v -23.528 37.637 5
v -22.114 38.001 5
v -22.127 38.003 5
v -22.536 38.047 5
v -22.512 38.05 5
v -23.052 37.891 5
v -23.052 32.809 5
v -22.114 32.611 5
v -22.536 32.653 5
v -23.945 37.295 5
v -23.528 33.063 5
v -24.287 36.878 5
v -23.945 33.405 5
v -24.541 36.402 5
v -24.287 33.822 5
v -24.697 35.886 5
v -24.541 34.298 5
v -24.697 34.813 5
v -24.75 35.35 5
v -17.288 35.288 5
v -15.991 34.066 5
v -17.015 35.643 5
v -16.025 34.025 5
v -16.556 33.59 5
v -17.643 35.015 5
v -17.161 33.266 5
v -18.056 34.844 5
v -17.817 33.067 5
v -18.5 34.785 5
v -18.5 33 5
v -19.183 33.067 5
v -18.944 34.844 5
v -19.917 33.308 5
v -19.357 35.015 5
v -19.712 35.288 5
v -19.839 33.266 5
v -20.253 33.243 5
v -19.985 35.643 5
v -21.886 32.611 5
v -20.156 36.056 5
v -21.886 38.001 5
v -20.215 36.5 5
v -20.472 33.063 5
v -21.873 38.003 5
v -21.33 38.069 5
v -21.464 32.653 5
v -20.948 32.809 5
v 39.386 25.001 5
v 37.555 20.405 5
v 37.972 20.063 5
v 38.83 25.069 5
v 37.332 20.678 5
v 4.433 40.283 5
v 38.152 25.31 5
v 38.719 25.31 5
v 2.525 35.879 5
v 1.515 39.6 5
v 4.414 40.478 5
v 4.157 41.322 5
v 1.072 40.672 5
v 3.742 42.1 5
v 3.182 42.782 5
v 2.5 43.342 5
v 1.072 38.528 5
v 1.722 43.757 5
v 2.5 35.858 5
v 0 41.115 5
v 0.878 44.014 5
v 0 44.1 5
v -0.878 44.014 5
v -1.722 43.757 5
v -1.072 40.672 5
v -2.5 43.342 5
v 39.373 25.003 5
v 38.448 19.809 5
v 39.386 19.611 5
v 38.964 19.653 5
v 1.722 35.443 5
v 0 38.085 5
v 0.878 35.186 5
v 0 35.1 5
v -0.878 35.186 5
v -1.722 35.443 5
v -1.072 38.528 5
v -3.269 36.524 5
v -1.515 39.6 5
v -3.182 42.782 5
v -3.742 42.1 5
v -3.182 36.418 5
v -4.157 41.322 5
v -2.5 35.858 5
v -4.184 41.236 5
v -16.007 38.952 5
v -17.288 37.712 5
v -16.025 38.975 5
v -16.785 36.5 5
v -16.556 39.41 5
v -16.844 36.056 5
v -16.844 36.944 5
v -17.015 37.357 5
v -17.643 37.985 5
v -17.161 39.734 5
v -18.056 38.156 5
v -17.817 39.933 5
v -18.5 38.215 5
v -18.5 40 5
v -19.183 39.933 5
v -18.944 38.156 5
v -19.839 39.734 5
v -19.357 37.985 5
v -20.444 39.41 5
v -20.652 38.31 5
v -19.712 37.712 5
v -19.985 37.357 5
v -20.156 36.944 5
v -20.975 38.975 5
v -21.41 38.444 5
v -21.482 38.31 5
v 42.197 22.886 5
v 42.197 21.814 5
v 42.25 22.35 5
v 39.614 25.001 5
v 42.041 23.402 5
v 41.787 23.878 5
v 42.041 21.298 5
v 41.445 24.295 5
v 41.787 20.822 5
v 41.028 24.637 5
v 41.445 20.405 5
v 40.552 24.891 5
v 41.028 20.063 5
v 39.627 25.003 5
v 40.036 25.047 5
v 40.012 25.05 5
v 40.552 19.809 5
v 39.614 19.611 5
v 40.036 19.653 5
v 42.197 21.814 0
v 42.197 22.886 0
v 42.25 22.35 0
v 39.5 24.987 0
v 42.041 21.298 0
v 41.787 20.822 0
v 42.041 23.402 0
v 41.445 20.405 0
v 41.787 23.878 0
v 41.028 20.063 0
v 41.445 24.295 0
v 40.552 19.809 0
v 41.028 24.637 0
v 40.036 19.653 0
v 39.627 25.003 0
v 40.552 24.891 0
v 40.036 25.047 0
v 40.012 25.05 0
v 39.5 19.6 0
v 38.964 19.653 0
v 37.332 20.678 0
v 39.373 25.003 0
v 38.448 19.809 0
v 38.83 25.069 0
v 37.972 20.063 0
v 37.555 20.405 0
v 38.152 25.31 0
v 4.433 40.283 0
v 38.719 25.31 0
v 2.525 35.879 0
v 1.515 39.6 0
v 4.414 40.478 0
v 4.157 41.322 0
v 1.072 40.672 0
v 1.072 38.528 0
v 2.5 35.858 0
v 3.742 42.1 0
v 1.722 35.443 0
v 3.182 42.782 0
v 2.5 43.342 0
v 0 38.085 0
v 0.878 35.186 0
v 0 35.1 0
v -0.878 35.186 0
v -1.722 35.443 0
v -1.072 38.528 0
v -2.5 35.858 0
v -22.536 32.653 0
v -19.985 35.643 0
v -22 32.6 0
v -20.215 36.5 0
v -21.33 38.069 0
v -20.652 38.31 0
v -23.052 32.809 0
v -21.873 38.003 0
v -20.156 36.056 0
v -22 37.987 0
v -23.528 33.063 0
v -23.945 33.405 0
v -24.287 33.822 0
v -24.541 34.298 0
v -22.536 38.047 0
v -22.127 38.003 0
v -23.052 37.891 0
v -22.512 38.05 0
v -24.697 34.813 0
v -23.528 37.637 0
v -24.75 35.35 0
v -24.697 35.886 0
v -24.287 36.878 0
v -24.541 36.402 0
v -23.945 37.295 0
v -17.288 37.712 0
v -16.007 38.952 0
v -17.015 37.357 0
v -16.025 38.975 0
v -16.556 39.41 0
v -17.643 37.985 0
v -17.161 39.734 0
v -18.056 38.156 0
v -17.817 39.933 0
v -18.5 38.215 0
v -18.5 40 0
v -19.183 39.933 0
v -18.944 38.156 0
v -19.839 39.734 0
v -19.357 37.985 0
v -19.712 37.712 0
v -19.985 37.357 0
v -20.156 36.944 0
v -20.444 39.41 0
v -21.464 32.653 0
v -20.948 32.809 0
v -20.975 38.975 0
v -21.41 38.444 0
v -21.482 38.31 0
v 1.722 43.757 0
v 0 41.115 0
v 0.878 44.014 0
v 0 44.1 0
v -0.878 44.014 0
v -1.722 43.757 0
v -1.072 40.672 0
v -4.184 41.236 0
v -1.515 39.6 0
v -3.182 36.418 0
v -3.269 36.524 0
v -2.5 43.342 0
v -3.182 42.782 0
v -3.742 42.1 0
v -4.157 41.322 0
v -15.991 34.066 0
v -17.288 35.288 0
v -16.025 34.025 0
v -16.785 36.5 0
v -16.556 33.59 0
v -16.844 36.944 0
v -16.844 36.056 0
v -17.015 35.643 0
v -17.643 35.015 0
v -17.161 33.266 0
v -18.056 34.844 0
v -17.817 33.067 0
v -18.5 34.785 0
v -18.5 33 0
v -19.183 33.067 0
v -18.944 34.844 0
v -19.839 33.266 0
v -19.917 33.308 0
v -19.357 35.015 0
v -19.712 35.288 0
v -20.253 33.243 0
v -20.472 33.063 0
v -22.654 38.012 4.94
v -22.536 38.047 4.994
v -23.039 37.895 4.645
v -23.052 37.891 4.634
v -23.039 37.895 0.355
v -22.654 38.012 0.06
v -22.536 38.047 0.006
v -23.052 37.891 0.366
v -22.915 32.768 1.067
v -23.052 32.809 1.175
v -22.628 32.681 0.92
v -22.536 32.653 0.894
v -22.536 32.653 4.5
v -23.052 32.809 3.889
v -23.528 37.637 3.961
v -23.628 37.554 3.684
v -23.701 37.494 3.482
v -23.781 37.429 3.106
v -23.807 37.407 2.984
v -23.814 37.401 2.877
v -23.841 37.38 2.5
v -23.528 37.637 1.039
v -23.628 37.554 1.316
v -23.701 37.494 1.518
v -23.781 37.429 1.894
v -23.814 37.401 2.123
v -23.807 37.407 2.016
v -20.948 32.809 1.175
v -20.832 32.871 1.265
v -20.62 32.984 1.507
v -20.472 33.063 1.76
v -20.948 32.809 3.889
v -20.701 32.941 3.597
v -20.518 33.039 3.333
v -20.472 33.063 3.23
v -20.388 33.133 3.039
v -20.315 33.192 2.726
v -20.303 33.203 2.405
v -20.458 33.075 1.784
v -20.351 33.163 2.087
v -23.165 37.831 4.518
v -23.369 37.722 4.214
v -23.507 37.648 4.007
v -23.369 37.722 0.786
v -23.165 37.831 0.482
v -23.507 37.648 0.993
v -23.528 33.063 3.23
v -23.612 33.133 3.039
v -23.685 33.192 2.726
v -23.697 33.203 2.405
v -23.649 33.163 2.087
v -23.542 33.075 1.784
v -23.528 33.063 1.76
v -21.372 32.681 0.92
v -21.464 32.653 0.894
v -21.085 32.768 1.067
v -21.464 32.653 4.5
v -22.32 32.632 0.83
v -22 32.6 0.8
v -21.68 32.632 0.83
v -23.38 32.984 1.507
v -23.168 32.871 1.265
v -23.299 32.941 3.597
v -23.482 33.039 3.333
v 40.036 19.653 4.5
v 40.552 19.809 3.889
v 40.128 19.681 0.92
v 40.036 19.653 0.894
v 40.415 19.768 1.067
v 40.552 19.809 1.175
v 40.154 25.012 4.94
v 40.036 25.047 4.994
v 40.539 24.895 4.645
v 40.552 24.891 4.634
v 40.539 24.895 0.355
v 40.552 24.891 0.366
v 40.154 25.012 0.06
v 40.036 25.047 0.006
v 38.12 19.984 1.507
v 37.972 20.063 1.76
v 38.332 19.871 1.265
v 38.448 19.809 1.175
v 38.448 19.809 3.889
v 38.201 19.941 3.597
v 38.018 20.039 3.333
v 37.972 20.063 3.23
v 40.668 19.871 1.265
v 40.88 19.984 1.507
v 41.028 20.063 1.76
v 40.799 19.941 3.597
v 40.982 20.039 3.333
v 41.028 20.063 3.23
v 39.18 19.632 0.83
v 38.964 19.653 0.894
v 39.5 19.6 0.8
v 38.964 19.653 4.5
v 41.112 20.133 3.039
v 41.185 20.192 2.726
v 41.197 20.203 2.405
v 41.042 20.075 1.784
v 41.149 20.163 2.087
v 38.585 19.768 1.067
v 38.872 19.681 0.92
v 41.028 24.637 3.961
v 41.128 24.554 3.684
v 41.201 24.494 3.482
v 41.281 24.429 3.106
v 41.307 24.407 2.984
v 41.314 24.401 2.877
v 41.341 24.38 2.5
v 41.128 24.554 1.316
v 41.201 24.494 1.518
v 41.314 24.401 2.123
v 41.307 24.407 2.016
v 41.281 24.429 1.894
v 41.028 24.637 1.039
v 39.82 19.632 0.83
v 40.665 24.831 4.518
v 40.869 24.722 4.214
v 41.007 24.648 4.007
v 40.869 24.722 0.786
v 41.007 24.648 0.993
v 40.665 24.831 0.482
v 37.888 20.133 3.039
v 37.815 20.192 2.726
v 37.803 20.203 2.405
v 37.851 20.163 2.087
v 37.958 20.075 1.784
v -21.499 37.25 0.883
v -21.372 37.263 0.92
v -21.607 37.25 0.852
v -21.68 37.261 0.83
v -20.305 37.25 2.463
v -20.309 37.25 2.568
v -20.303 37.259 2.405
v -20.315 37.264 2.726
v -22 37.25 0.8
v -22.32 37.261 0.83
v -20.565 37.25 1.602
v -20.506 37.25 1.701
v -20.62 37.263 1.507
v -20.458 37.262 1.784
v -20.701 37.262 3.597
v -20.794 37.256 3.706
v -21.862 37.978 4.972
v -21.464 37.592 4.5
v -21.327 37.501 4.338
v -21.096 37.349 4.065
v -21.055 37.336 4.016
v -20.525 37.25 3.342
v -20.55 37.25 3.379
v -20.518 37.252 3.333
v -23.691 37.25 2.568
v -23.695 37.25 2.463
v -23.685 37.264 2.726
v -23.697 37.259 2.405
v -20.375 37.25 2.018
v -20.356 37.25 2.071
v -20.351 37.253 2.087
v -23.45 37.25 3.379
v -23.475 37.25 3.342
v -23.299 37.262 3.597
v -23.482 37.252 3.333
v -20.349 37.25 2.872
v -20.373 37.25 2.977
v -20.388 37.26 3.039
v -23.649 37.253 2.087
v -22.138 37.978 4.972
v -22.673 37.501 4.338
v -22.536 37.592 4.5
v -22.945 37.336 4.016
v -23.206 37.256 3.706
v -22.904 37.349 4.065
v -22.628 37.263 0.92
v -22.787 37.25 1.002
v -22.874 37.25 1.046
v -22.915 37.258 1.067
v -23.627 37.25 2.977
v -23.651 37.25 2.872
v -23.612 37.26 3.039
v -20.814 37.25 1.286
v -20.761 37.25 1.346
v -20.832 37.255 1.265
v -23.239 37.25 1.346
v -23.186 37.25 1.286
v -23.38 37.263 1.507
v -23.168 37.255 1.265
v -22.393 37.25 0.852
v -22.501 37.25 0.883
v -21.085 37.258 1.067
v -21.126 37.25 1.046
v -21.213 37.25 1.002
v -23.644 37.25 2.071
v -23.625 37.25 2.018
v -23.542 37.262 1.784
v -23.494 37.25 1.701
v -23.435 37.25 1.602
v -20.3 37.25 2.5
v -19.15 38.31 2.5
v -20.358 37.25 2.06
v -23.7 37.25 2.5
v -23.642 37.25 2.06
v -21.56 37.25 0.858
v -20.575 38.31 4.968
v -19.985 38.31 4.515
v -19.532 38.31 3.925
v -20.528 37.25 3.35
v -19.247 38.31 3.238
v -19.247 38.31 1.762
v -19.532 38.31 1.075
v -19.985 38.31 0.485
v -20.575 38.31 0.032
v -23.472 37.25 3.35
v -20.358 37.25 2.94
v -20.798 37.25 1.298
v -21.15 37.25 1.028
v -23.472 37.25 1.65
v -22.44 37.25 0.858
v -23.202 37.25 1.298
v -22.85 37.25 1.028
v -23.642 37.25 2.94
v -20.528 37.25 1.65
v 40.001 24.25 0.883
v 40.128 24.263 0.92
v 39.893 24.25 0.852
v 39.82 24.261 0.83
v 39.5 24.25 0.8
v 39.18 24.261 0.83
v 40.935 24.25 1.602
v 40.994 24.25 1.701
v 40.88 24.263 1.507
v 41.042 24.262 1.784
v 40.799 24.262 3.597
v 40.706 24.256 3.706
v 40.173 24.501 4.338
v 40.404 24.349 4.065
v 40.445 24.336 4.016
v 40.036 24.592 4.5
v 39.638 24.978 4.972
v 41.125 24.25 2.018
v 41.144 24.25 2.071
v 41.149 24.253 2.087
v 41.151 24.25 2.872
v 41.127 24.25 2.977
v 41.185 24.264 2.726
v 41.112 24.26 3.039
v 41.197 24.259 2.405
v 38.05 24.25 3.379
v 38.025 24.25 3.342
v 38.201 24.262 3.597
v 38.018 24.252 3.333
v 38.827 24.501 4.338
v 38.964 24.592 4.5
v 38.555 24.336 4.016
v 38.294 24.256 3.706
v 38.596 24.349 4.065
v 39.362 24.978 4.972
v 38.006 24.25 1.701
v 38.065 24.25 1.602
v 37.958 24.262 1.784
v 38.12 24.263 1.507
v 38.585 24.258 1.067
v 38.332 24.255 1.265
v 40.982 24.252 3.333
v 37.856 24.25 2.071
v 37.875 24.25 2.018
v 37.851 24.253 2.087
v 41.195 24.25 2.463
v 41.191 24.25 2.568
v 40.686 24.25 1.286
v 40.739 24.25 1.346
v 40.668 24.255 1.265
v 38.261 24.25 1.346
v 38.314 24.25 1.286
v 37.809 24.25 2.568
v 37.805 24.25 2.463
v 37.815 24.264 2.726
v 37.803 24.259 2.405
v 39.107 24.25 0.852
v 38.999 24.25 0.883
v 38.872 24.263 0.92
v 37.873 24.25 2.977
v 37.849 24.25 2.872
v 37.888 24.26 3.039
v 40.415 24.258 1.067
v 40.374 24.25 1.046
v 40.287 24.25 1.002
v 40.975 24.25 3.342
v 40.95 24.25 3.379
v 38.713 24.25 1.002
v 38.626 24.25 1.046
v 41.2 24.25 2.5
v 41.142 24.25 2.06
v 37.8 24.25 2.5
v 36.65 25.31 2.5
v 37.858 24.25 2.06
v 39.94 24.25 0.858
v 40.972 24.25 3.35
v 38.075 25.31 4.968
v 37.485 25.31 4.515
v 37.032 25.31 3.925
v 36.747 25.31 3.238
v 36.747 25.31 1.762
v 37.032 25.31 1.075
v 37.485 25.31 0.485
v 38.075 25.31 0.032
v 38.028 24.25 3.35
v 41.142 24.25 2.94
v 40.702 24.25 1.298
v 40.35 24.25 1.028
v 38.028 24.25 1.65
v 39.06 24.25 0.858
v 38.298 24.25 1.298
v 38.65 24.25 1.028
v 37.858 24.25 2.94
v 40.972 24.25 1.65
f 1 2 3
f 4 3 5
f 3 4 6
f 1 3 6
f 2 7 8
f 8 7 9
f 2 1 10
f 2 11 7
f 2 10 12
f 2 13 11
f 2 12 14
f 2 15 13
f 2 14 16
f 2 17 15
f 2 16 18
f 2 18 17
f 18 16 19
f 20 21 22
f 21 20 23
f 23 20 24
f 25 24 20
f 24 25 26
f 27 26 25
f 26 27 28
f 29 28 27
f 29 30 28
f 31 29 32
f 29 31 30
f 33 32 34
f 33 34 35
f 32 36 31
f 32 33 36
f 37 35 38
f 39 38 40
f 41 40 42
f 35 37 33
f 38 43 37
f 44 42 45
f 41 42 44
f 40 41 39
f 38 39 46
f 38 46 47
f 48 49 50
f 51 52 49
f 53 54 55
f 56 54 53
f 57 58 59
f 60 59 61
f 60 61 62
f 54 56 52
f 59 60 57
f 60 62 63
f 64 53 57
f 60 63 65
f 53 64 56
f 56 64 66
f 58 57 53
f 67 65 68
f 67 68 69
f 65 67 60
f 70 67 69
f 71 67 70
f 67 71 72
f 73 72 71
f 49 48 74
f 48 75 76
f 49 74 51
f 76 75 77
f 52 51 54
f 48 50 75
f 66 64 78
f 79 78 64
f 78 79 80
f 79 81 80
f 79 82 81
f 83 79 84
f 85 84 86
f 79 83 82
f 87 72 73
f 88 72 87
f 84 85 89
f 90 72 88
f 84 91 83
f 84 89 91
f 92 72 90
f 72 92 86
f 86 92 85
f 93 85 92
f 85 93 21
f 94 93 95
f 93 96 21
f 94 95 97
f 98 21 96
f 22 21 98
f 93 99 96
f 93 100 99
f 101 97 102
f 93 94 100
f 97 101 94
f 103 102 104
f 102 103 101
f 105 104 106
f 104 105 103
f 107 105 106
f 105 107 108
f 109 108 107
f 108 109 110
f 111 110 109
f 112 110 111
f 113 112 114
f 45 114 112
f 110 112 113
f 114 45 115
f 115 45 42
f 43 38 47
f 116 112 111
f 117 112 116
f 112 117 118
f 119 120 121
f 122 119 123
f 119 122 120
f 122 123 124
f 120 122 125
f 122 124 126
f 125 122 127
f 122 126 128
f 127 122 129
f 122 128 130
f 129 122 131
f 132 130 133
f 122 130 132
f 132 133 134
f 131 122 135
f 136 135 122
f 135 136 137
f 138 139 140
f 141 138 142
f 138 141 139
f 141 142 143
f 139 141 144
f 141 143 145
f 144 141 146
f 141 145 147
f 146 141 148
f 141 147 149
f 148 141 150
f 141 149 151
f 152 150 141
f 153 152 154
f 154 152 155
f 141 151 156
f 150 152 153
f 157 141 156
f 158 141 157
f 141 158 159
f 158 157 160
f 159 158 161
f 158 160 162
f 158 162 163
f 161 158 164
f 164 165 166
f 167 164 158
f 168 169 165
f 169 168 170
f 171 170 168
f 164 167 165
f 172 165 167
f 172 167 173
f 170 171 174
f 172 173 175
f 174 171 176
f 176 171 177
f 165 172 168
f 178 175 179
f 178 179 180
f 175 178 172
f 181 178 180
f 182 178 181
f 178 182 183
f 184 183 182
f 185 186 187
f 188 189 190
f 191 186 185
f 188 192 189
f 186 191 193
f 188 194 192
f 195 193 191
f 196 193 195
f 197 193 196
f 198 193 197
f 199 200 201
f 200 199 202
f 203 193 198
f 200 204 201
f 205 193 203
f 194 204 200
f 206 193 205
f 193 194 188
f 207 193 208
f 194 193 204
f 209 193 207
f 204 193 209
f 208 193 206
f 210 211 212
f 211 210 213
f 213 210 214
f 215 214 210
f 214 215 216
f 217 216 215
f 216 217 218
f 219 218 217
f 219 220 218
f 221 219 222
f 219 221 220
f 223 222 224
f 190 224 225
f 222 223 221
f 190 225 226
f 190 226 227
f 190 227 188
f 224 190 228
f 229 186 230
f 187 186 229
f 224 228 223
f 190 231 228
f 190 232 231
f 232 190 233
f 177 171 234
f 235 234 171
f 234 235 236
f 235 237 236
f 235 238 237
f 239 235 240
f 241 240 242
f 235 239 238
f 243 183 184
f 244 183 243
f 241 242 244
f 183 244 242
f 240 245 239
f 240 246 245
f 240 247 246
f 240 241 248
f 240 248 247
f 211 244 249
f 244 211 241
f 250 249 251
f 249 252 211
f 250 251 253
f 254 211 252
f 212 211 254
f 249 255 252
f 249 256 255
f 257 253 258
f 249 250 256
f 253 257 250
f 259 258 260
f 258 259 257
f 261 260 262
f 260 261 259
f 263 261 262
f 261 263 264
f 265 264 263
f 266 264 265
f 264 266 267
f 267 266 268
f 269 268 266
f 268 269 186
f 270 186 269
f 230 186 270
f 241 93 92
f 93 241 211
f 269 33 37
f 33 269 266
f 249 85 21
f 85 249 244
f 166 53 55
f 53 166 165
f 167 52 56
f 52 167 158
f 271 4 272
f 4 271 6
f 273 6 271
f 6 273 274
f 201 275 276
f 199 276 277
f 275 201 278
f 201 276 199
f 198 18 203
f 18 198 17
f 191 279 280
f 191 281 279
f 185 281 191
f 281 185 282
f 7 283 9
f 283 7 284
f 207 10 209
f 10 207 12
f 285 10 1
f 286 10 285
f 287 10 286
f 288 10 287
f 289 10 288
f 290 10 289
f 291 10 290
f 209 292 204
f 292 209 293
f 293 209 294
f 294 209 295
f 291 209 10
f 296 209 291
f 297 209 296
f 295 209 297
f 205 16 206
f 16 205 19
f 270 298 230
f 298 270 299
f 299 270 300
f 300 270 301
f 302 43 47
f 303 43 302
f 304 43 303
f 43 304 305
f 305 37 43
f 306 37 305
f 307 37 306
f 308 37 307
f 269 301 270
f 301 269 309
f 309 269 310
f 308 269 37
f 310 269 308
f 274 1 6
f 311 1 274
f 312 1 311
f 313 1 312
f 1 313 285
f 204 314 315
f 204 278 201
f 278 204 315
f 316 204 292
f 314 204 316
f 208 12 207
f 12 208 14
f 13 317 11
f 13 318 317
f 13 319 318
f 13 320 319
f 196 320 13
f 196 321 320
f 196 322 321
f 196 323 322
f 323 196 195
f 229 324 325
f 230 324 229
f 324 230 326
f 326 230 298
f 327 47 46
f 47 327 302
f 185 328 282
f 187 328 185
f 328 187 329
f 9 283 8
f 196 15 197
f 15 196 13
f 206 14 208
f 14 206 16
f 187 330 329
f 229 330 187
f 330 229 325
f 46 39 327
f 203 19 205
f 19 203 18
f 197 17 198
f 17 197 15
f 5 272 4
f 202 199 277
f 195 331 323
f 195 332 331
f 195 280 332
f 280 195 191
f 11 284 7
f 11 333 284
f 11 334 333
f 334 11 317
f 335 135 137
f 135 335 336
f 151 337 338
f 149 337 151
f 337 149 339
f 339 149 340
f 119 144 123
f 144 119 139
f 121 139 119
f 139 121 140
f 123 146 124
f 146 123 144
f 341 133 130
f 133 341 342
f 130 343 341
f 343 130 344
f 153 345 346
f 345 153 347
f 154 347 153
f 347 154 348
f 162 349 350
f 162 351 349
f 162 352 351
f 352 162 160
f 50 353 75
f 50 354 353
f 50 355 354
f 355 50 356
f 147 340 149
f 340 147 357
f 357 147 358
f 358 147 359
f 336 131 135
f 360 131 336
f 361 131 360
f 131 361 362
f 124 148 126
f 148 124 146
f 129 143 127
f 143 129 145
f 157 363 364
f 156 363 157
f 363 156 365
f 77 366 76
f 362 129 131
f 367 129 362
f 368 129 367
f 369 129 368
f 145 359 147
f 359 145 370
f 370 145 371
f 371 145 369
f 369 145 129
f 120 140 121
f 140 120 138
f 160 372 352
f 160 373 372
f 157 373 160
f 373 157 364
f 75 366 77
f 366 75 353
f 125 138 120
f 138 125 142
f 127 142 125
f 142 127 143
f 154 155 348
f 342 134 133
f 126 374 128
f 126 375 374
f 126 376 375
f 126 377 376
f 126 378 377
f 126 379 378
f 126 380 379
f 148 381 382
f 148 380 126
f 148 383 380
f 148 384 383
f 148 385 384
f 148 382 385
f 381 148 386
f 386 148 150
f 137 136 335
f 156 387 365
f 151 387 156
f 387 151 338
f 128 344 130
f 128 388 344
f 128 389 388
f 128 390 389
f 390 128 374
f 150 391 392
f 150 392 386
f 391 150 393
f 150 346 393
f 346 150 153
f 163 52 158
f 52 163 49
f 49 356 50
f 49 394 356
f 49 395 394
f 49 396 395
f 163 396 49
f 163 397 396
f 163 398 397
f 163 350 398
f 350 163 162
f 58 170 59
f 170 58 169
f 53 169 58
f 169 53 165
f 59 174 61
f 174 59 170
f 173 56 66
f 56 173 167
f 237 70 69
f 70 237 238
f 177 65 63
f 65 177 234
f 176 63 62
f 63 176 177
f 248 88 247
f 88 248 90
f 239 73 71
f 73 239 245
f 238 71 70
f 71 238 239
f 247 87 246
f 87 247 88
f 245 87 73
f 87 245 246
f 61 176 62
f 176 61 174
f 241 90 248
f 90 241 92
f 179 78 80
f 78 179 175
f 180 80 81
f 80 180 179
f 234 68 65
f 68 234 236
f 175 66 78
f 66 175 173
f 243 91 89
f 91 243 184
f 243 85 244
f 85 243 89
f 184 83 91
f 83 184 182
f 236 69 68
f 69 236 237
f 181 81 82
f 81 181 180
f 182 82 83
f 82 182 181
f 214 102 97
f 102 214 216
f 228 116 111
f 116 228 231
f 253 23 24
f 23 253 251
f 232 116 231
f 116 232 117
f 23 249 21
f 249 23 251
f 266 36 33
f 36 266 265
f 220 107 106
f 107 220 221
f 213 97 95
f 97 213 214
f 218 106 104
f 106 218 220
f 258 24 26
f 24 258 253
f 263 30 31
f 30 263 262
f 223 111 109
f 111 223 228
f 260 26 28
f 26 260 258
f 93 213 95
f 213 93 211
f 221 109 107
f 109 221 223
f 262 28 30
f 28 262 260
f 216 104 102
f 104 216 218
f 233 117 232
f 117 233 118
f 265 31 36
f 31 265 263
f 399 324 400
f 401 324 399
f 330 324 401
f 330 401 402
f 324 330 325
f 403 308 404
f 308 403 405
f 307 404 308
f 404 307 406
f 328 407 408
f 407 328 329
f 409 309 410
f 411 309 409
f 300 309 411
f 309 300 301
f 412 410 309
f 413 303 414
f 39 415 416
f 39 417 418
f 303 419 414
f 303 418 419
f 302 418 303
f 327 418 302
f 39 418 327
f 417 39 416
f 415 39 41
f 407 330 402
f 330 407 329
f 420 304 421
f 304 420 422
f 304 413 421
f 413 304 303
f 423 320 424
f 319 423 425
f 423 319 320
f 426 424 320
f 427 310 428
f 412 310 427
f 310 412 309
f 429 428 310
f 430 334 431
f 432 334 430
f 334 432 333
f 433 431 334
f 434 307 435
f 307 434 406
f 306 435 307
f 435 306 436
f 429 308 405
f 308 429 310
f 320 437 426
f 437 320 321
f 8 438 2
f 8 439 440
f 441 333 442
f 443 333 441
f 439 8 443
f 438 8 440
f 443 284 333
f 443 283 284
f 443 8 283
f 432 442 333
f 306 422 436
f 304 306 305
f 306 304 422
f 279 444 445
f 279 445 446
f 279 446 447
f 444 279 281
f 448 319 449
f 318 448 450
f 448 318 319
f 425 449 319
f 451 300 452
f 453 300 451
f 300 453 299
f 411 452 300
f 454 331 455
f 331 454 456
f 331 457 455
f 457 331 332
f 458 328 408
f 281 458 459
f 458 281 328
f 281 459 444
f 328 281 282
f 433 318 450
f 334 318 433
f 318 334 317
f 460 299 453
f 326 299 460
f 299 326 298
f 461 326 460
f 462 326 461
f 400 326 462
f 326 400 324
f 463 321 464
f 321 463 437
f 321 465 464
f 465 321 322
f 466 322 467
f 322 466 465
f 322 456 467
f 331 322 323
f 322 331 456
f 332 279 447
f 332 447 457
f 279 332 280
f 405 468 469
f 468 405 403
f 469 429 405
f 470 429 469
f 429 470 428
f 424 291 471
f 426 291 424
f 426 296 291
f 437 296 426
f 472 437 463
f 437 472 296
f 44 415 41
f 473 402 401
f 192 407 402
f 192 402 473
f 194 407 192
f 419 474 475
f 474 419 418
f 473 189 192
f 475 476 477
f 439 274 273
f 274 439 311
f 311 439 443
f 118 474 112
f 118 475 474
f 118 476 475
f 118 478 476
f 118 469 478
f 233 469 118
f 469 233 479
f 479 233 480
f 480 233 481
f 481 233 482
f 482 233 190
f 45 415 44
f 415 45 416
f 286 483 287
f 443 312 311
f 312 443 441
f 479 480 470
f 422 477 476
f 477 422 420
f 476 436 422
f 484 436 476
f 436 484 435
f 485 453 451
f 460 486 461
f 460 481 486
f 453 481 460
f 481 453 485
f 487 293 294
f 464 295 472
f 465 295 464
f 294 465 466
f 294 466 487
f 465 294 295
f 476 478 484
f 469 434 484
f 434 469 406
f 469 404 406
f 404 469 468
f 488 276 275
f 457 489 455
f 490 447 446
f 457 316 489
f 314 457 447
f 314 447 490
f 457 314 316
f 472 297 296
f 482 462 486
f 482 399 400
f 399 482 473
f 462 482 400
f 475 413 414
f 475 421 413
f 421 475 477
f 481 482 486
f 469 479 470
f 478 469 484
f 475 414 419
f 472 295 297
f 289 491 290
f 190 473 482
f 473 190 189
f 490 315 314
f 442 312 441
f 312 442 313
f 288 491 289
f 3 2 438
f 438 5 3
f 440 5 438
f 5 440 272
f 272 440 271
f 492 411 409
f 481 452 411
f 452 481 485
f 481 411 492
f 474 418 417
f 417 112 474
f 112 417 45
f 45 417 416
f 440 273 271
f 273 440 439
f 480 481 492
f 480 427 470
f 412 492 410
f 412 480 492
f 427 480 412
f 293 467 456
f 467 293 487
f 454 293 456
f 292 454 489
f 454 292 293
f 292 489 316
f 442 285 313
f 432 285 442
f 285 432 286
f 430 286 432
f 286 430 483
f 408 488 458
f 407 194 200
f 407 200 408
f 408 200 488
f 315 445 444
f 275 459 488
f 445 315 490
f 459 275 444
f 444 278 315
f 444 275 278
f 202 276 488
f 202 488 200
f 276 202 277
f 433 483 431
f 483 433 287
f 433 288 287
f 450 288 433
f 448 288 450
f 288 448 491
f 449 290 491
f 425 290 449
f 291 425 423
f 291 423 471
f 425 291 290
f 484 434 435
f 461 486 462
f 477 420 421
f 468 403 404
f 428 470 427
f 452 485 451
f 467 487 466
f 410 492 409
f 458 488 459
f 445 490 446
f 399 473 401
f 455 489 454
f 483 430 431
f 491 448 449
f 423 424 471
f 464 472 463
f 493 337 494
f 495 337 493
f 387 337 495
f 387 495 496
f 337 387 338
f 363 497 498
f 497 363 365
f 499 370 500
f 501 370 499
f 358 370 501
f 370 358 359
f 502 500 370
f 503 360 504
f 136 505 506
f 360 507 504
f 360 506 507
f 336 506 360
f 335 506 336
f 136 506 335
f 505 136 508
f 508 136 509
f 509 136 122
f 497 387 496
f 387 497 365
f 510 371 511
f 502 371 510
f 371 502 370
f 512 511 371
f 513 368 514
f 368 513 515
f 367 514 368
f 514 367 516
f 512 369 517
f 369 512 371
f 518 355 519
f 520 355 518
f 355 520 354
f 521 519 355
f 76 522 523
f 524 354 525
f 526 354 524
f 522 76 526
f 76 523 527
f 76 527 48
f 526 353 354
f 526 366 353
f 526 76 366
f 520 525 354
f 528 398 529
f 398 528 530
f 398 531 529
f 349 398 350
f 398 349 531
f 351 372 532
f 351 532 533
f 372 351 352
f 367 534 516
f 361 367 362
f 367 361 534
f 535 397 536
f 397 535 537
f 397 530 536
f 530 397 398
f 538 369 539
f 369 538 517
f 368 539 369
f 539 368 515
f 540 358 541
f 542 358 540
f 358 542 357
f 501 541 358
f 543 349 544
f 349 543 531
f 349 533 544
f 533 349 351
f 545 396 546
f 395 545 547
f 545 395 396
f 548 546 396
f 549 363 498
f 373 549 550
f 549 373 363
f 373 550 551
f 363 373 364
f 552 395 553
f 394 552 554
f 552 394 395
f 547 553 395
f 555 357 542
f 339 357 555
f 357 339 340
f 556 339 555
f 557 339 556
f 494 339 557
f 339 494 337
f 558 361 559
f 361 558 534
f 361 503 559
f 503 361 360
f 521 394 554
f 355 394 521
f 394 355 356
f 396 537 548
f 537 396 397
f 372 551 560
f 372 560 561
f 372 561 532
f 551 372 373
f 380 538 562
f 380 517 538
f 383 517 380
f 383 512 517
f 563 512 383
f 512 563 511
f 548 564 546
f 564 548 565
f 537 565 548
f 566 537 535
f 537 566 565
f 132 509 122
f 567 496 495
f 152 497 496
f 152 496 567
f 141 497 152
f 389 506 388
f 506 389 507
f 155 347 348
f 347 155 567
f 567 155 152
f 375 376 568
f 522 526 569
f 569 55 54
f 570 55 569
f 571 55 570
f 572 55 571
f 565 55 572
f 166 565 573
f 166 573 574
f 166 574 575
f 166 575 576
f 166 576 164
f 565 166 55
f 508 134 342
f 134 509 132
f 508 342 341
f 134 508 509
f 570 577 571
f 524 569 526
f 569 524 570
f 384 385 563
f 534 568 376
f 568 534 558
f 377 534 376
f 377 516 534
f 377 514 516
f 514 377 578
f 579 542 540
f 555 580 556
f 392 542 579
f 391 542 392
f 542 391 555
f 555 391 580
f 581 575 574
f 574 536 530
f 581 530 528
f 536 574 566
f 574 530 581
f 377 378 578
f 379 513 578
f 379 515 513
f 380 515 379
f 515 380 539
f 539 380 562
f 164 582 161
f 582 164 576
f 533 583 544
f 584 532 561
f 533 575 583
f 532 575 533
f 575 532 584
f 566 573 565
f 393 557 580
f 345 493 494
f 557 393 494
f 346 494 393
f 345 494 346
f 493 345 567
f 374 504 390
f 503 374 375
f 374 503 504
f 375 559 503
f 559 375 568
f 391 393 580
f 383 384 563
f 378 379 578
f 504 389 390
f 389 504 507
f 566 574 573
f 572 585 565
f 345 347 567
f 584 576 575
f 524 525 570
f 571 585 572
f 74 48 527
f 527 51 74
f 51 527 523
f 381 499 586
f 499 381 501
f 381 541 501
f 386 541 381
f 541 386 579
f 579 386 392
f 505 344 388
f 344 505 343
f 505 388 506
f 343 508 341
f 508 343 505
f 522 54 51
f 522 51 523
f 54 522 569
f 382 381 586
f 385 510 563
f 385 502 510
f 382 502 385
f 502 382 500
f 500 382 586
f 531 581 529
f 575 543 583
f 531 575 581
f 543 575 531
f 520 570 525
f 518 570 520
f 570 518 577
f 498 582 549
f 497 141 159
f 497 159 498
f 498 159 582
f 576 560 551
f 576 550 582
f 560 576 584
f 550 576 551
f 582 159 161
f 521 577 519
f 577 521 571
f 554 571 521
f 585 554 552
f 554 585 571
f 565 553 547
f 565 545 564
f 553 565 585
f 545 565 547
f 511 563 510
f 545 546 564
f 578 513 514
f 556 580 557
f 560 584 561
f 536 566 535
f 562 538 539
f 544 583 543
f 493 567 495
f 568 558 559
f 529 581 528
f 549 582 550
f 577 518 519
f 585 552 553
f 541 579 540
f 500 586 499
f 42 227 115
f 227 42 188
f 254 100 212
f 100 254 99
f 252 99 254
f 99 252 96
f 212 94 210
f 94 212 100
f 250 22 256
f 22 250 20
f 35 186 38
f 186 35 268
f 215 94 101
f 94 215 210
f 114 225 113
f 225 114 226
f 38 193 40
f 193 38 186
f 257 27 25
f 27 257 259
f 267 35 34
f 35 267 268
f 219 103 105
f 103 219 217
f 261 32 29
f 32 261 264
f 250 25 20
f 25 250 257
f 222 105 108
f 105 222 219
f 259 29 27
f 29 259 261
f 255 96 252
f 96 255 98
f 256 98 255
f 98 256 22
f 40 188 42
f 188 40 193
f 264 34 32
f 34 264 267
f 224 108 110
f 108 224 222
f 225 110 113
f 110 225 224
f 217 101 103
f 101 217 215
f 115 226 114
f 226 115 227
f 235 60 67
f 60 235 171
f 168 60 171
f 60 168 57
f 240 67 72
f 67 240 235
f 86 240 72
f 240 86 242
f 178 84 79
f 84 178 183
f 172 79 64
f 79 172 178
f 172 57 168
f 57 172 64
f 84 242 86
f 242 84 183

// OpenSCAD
// =====================================================================
// child_lcd_support.scad — one of two LCD support arches
//
// Two copies are used at the C-MAIN axial mounting-hole planes. M3 metal
// spacers connect the arch to C-MAIN:
//   X=-22.0 : 30 mm spacer, X=+39.5 : 17 mm spacer (M3 male-female, standing on
//   the C-MAIN top face; the arch boss sits on the spacer's female end face).
// The asymmetric arch follows the circular tube instead of wasting radial room
// on a flat panel. Horizontal screw holes are teardrops for clean PLA printing.
//
// Variants (variants.txt):
//   lower  have_ear=true   — z 22..27 in the assembly. Carries the 90° anchor ear:
//                            a foot at (0, 47) that stands on the bottom flange's
//                            inner face (world z=19) and takes an M3x12 into the
//                            flange's 4x M3 BCD94 tapped hole (90° position).
//                            Together with the deck lugs at 0°/180° this gives a
//                            3-point clamp of the whole interior to the flange.
//   upper  have_ear=false  — z 117..122, plain arch.
//
// Print orientation:
//   upper : flat, as modelled (z=0 on the bed).
//   lower : FLIPPED — the arch top face (z=5) on the bed, so the ear foot
//           (which reaches 2.7 mm below the arch) grows upward. The teardrop
//           apexes are mirrored automatically when have_ear=true.
//
// Primitives only (cube / cylinder / polygon extrusions) so csg_to_step keeps
// true faces — 2026-09-03: replaced the hull() capsules and hull() teardrops
// that made FreeCAD drop 94 % of the volume and fall back to a faceted STEP.
// =====================================================================

include <../../../../../scad/lib/util.scad>;

/* [C-MAIN transformed hole positions] */
left_x = -22.0;                 // H3/H4 row (KiCad y=66)
right_x = 39.5;                 // H1/H2 row (KiCad y=4.5)
board_y = 2.6;                  // board top face in assembly
left_spacer = 30.0;             // was 35: boss centre = board_y + spacer + boss_d/2. 30 (not 32) so the
                                // hinge-rod boss (bottom y 33.0) clears the spacer's hex top (y 32.6)
right_spacer = 17.0;            // was 20

/* [LCD interface] */
lcd_anchor_x = 0;
lcd_anchor_y = 39.6;
lcd_pilot_d = 2.8;              // M3 self-tap from cradle end

/* [Hinge rod] */
// 2026-08-28: the door hinge is an M3 threaded rod (~105 mm) captured by BOTH arches
// (nut under the lower arch, nut above the upper arch). No pin head next to the door
// plate any more. Axis = child_lcd_cradle hinge_x / world Y 36.5.
hinge_x = -18.5;
hinge_y = 36.5;
hinge_boss_d = 7.0;
hinge_clear_d = 3.4;

/* [Part] */
rib_t = 5.0;                    // axial thickness / print height
beam_w = 4.8;
mount_boss_d = 5.5;             // common M3 hex-spacer envelope
mount_clear_d = 3.4;
tube_id = 101.6;
wall_clear = 2.5;

/* [Bottom-flange anchor ear (lower variant only)] */
// 2026-09-03: 3-point fixing of the interior to the bottom flange. The 4x M3 BCD94
// tapped holes are on the FLANGE inner face (BR-101040, verified from the STEP and
// the WTE datasheet Rev C.5 — see parts/child/exterior/cots/wte4_flange/). 0°/180°
// are taken by child_vtray_deck lugs on MF10 spacers; 90° (0, +47) is the only hole
// the deck cannot reach (C-MAIN sits between), so this arch carries it. 270° is
// blocked by the battery box floor.
have_ear      = false;          // variants.txt sets this
flange_bcd    = 94;             // BR-101040 inner-face M3 hole circle (STEP: 94.000)
flange_face_z = 19;             // world z of the bottom flange inner face (piston length 19.1)
arch_z0       = 22;             // world z of this arch's bottom face (lower arch placement)
ear_gap       = 0.3;            // nominal gap foot→flange: the metal spacers at 0°/180° stay the datum,
                                // this screw only snugs the arch down (0.3 mm over a 40 mm beam)
ear_x         = 0;
ear_od        = 5.2;            // hole 3.4 → 0.9 mm wall; outer edge r 49.6 (tube ID/2 − 1.0 = 49.8 max)
ear_clear_d   = 3.4;            // M3 clearance
ear_web_w     = 5.2;            // web between the LCD anchor boss and the ear (X width)
screw_head_d_ear = 5.5;         // M3 pan / socket head on top of the arch (z 27..30 world)
hinge_lug_y_max  = 42.5;        // child_lcd_hinge_frame lower lug, max +Y at z 27..32 (assembly measurement)
frame_screw_head_y_max = 42.35; // its M3x10 head, z 32..35

$fa = 4;
$fs = 0.3;

// Spacer end face touches the boss cylinder, so the boss centre is boss_d/2 further out.
left_y = board_y + left_spacer + mount_boss_d/2;
right_y = board_y + right_spacer + mount_boss_d/2;
screw_head_d = 5.5;             // JIS M3 flat (countersunk) head, flush with the boss +Y face
screw_csk_h = (screw_head_d - mount_clear_d)/2;   // 90 deg countersink depth (1.05)
r_use = tube_id/2-wall_clear;
ear_y  = flange_bcd/2;                           // 47
ear_z0 = -(arch_z0 - flange_face_z) + ear_gap;   // -2.7 (world 19.3)
ear_h  = rib_t - ear_z0;                         // 7.7
apex   = have_ear ? -1 : 1;                      // teardrop apex direction in print orientation

function rad(x,y)=sqrt(x*x+y*y);
assert(rad(abs(hinge_x)+hinge_boss_d/2, hinge_y+hinge_boss_d/2) < r_use, "hinge rod boss touches tube");
spacer_ac = 5.5/cos(30);        // M3 hex spacer across-corners
assert(hinge_y - hinge_boss_d/2 >= board_y + left_spacer + 0.3 || abs(hinge_x - left_x) > (hinge_boss_d + spacer_ac)/2,
       "hinge rod boss overlaps the left spacer top");
// The spacer screws are JIS M3 flat heads (d 5.5) countersunk flush into the +Y
// face of each boss, so nothing protrudes beyond the boss corner toward the tube.
assert(rad(abs(left_x) + mount_boss_d/2, left_y + mount_boss_d/2) < tube_id/2 - 1.5,
       "left spacer boss corner (flush screw head) too close to tube");
assert(rad(abs(right_x) + mount_boss_d/2, right_y + mount_boss_d/2) < tube_id/2 - 1.5,
       "right spacer boss corner (flush screw head) too close to tube");
assert(rad(left_x,left_y)+mount_boss_d/2 < r_use,
       "35 mm LCD spacer boss touches tube");
assert(rad(right_x,right_y)+mount_boss_d/2 < r_use,
       "20 mm LCD spacer boss touches tube");

// Anchor ear (checked even when have_ear=false so the numbers stay honest)
assert(ear_y + ear_od/2 <= tube_id/2 - 1.0,
       str("anchor ear touches tube r=", ear_y + ear_od/2, " > ", tube_id/2 - 1.0));
assert(rad(ear_web_w/2, ear_y + ear_od/2) <= tube_id/2 - 1.0, "anchor ear corner touches tube");
assert(ear_y - ear_clear_d/2 - (lcd_anchor_y + lcd_pilot_d/2) >= 1.5,
       "anchor ear hole too close to the LCD anchor pilot");
assert(ear_y - screw_head_d_ear/2 >= hinge_lug_y_max + 1.0,
       str("anchor screw head hits the hinge-frame lug: ", ear_y - screw_head_d_ear/2, " vs ", hinge_lug_y_max));
assert(ear_y - screw_head_d_ear/2 >= frame_screw_head_y_max + 1.0, "anchor screw head hits the frame screw head");
assert(ear_z0 <= 0 && ear_gap >= 0 && ear_gap <= 0.5, "ear foot must reach the flange face (gap 0..0.5)");
flange_bore_r = 88.5/2;         // the foot only bears where r >= bore radius (44.25)
assert(ear_y + ear_od/2 - flange_bore_r >= 4.0,
       str("anchor foot bears on only ", ear_y + ear_od/2 - flange_bore_r, " mm of flange face"));

// ---- primitives-only helpers ---------------------------------------
// Straight bar of width w between two points, with round ends (= old capsule).
module bar(a, b, w, h) {
    L = rad(b[0]-a[0], b[1]-a[1]);
    ang = atan2(b[1]-a[1], b[0]-a[0]);
    translate([a[0],a[1],0]) rotate([0,0,ang]) translate([0,-w/2,0]) cube([L, w, h]);
    for (p=[a,b]) translate([p[0],p[1],0]) cylinder(d=w,h=h,$fn=32);
}
// Teardrop prism (circle + 50° self-supporting roof), axis along Z, apex to +Y.
// ONE polygon: FreeCAD's CSG importer returns a null shape for any boolean of a
// cylinder with an overlapping extruded polygon (tested 2026-09-03), so the arc
// is discretised into the same polygon as the roof.
module teardrop_prism(d, len, fn=24) {
    r = d/2; D = 1.55*r; th = acos(r/D);
    pts = concat([[0, D]],
                 [for (i=[0:fn]) let(a = 90 + th + i*(360 - 2*th)/fn) [r*cos(a), r*sin(a)]]);
    linear_extrude(len) polygon(pts);
}
// Horizontal bore along +Y through a +Y/-Y wall; apex faces +Z (dir=1) or -Z (dir=-1).
module teardrop_bore_y(d, len, dir=1) {
    rotate([-90,0,0]) rotate([0,0,dir > 0 ? 180 : 0]) teardrop_prism(d, len);
}

difference() {
    union() {
        bar([left_x,left_y],[lcd_anchor_x,lcd_anchor_y],beam_w,rib_t);
        bar([lcd_anchor_x,lcd_anchor_y],[right_x,right_y],beam_w,rib_t);
        for (p=[[left_x,left_y],[right_x,right_y]])
            translate([p[0],p[1],0]) cylinder(d=mount_boss_d,h=rib_t,$fn=32);
        translate([lcd_anchor_x,lcd_anchor_y,0]) cylinder(d=9,h=rib_t,$fn=32);
        translate([hinge_x,hinge_y,0]) cylinder(d=hinge_boss_d,h=rib_t,$fn=32);
        if (have_ear) {
            // foot + web: from the LCD anchor boss out to the flange hole circle,
            // full height from the flange face (z -2.7) to the arch top (z 5)
            translate([ear_x,ear_y,ear_z0]) cylinder(d=ear_od,h=ear_h,$fn=32);
            translate([ear_x-ear_web_w/2,lcd_anchor_y,ear_z0]) cube([ear_web_w, ear_y-lcd_anchor_y, ear_h]);
        }
    }
    // Hinge rod bore (axial, prints clean)
    translate([hinge_x,hinge_y,-0.1]) hole(hinge_clear_d,rib_t+0.2,fn=24);

    // Spacer screws run horizontally in assembly and in this print orientation.
    for (p=[[left_x,left_y],[right_x,right_y]])
        translate([p[0],p[1]-mount_boss_d/2-0.2,rib_t/2]) {
            teardrop_bore_y(mount_clear_d,mount_boss_d+0.4,apex);
            // 90 deg countersink on the +Y face for the flush flat-head screw
            translate([0,mount_boss_d+0.4-screw_csk_h,0]) rotate([-90,0,0])
                cylinder(d1=mount_clear_d,d2=screw_head_d+0.2,h=screw_csk_h+0.01,$fn=24);
        }

    // Cradle attaches axially; this pilot is vertical and prints accurately.
    // Runs through the ear web too, so the hinge-frame screw tip never bottoms out.
    translate([lcd_anchor_x,lcd_anchor_y,min(0,ear_z0)-0.1])
        hole(lcd_pilot_d,rib_t-min(0,ear_z0)+0.2,fn=8);

    // Anchor ear: M3 clearance, axial (screw from the top into the flange)
    if (have_ear)
        translate([ear_x,ear_y,ear_z0-0.1]) cylinder(d=ear_clear_d,h=ear_h+0.2,$fn=24);
}

if (have_ear)
    echo(str("child_lcd_support lower: anchor ear at (", ear_x, ", ", ear_y, ") foot z ",
             arch_z0 + ear_z0, " (flange face ", flange_face_z, " + gap ", ear_gap, "), screw head top z ",
             arch_z0 + rib_t + 2.0, ", M3x12 engages flange ", 12 - (rib_t - ear_z0) - ear_gap, " mm"));
